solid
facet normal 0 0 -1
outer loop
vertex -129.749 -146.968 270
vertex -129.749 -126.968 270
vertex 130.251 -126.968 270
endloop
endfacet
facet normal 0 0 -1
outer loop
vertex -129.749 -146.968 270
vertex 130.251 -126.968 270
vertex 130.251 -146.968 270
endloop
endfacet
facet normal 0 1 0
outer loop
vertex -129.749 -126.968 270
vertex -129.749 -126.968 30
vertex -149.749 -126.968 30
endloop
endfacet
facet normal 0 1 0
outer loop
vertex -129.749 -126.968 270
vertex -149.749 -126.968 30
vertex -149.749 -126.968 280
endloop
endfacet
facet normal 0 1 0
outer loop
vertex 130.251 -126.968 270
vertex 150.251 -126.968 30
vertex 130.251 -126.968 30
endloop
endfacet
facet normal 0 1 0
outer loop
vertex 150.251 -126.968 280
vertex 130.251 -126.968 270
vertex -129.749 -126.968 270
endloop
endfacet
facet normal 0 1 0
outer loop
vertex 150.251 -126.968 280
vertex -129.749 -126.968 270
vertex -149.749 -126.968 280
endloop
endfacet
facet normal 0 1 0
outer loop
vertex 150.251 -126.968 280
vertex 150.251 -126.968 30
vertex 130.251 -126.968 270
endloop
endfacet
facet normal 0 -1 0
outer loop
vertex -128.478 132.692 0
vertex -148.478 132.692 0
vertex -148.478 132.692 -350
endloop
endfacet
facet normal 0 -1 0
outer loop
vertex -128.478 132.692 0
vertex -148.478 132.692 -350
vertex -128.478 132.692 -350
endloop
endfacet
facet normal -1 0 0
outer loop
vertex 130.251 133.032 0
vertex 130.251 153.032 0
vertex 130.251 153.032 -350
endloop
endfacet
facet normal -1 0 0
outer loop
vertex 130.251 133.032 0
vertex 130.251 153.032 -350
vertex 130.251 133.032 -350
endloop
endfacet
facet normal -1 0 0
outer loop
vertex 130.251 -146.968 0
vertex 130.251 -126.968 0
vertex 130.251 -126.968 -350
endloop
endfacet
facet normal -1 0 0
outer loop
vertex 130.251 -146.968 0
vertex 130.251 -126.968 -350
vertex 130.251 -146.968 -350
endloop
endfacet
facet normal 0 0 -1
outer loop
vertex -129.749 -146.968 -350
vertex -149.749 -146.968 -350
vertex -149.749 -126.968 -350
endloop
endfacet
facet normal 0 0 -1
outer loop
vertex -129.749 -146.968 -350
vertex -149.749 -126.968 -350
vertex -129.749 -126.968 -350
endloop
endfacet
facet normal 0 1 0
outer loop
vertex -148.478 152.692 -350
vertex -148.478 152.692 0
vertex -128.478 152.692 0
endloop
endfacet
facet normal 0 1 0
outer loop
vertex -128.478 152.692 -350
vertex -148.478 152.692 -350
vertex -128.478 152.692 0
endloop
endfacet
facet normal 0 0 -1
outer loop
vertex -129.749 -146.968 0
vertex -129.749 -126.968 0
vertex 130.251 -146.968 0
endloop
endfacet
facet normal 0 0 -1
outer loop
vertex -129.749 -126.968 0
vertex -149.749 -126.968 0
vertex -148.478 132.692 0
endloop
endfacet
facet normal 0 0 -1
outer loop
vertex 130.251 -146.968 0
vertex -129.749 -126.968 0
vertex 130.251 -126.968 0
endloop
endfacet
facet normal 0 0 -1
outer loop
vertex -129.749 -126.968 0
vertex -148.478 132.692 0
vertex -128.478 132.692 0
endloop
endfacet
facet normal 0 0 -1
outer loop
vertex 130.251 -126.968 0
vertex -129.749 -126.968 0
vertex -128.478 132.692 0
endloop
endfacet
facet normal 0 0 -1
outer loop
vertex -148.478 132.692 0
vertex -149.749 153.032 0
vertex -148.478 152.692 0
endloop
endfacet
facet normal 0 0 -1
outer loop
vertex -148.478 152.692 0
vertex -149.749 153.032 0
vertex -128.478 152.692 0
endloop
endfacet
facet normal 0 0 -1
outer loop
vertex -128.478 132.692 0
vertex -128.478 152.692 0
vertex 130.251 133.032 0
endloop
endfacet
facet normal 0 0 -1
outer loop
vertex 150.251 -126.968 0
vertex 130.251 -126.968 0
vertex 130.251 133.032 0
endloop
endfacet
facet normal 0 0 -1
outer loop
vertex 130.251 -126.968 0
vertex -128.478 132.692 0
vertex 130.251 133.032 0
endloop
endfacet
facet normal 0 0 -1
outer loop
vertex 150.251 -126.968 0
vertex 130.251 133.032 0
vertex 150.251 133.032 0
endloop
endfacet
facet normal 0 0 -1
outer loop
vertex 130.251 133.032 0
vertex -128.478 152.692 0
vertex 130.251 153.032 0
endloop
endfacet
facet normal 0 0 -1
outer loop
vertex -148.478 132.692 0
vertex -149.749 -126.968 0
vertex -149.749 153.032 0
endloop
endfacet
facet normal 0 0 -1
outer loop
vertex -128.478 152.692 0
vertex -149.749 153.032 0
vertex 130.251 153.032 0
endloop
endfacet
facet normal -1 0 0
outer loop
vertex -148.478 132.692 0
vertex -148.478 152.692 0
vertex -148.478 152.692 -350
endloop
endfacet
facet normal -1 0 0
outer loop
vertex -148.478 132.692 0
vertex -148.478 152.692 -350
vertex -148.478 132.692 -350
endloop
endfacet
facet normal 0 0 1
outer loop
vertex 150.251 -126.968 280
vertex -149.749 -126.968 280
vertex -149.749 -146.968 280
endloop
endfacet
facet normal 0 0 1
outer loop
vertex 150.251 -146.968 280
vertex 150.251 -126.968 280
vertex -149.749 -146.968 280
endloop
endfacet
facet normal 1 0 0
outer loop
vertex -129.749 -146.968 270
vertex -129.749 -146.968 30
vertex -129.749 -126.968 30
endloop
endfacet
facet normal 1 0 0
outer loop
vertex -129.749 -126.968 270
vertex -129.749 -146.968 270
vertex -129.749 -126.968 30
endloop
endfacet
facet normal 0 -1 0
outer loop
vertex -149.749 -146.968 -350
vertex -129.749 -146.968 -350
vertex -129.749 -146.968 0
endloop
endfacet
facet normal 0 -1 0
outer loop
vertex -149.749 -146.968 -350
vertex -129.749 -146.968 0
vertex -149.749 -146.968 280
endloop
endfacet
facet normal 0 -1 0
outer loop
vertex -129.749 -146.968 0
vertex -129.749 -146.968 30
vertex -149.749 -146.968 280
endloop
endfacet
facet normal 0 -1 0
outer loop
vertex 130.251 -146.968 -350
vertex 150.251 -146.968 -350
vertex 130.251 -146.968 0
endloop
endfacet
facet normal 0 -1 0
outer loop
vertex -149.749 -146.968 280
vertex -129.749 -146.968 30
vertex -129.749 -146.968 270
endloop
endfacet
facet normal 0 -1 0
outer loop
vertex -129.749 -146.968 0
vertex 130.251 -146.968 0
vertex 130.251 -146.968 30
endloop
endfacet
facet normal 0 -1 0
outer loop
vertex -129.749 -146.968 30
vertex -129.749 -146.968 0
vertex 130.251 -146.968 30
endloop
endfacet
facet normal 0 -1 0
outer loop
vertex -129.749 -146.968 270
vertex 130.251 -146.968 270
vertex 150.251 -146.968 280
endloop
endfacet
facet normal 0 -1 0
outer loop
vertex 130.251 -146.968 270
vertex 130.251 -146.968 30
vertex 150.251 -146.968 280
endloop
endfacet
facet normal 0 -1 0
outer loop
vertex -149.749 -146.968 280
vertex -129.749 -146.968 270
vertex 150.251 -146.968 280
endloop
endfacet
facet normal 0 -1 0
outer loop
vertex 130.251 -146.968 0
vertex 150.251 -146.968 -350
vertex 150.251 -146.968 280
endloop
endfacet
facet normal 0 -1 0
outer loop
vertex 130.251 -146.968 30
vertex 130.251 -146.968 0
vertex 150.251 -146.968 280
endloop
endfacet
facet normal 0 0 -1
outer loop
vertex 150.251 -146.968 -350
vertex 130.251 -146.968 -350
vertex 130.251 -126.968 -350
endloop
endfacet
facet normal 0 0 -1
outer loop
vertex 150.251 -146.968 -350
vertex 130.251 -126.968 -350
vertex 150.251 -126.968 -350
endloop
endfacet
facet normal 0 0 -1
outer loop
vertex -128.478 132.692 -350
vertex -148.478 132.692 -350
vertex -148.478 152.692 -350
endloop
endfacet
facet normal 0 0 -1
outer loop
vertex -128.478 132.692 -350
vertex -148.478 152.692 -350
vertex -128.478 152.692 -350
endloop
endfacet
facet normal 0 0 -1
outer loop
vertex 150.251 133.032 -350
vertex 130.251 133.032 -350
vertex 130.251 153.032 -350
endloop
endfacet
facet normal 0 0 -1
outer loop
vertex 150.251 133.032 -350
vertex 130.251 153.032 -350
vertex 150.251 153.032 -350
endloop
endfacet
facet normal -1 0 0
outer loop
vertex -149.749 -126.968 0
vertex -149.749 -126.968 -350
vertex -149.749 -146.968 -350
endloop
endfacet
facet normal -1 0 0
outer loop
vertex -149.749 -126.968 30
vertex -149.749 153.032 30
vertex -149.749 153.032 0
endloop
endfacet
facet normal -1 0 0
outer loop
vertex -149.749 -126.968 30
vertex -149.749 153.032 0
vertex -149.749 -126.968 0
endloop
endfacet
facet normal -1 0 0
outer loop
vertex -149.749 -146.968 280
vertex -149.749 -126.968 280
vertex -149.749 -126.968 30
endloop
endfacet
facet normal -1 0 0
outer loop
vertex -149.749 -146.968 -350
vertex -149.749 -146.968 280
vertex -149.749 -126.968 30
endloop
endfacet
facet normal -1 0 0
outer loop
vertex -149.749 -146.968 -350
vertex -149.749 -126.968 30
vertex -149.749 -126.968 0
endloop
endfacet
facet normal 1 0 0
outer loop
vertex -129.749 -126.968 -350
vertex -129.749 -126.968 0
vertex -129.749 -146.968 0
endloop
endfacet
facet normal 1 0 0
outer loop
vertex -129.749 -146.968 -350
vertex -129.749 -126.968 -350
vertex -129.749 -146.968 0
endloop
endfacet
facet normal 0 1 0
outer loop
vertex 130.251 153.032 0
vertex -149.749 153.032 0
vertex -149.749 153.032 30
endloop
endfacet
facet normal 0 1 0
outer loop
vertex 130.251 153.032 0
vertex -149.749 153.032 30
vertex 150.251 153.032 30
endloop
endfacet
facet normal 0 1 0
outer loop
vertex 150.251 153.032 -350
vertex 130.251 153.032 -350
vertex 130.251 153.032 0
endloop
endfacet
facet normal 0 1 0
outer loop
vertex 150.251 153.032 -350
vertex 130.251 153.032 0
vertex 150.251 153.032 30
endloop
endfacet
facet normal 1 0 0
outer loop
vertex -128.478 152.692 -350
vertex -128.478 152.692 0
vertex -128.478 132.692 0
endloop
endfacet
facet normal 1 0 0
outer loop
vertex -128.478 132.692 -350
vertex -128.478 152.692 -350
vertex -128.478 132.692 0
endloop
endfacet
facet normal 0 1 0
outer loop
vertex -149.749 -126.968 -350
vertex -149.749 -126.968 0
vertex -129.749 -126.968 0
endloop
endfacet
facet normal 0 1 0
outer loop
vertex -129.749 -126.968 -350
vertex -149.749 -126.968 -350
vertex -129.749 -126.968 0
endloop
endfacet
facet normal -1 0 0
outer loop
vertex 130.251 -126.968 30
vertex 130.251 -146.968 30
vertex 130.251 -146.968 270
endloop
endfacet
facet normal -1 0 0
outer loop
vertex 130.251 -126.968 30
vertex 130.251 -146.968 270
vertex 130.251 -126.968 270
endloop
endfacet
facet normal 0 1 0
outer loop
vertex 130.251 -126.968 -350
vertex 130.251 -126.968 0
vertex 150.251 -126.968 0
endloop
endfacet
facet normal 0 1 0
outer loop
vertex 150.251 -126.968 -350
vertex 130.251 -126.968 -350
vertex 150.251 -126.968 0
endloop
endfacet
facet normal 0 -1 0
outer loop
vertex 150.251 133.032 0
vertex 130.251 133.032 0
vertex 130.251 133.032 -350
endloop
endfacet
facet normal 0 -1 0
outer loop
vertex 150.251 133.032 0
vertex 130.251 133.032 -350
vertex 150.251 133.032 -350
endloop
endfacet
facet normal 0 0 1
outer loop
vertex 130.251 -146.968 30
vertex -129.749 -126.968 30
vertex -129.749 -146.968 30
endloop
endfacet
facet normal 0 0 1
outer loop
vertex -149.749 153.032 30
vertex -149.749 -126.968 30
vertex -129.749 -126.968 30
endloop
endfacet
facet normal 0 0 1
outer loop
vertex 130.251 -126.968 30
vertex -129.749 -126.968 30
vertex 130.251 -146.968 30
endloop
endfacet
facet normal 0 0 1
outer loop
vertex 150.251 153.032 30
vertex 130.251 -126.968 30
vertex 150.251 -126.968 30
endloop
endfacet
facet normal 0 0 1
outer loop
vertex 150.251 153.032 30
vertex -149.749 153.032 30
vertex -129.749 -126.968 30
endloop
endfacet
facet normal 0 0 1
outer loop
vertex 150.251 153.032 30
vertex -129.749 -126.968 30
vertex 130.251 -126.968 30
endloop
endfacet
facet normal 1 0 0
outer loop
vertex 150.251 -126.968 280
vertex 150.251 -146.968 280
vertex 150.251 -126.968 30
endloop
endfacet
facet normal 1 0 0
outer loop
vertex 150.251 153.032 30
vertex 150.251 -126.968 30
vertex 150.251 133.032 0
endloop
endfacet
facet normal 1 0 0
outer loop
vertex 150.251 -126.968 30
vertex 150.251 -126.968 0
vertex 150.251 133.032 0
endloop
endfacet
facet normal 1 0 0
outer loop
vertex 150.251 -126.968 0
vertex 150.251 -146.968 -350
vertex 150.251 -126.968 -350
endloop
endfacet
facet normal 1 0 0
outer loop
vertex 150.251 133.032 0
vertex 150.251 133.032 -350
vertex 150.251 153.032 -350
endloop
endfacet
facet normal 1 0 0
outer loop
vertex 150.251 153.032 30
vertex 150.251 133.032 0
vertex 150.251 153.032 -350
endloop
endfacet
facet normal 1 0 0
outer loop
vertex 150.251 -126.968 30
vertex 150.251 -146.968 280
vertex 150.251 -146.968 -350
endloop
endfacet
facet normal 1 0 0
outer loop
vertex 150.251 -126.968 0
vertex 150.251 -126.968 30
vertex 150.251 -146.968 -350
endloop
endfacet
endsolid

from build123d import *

# Parameters (mm, degrees)
F0_W     = 300
F0_H     = 300
F1_DEPTH = 30
F3_W     = 20
F3_H     = 20
F4_DEPTH = 350
F5_W     = 20
F5_H     = 20
F6_DEPTH = 250
F7_W     = 20
F7_H     = 10
F8_DEPTH = 260


with BuildPart() as f1:
    # F0 (on Top) → F1 (new body)
    with BuildSketch(Plane.XY):
        with Locations((0.250861, 3.03171)):
            Rectangle(F0_W, F0_H)
    extrude(amount=F1_DEPTH)

    # F3 (on face) → F4 (join)
    with BuildSketch(Plane(origin=(0, 0, 0), x_dir=(1, 0, 0), z_dir=(0, 0, -1))):
        with Locations((-138.477522, -142.692491)):
            Rectangle(F3_W, F3_H)
        with Locations((-139.749139, 136.96829)):
            Rectangle(F3_W, F3_H)
        with Locations((140.250861, -143.03171)):
            Rectangle(F3_W, F3_H)
        with Locations((140.250861, 136.96829)):
            Rectangle(F3_W, F3_H)
    extrude(amount=F4_DEPTH)

    # F5 (on face) → F6 (join)
    with BuildSketch(Plane.XY.offset(30)):
        with Locations((140.250861, -136.96829)):
            Rectangle(F5_W, F5_H)
        with Locations((-139.749139, -136.96829)):
            Rectangle(F5_W, F5_H)
    extrude(amount=F6_DEPTH)

    # F7 (on face) → F8 (join)
    with BuildSketch(Plane(origin=(130.250861, 0, 0), x_dir=(0, -1, 0), z_dir=(-1, 0, 0))):
        with Locations((136.96829, 275)):
            Rectangle(F7_W, F7_H)
    extrude(amount=F8_DEPTH)


solid = f1.part
